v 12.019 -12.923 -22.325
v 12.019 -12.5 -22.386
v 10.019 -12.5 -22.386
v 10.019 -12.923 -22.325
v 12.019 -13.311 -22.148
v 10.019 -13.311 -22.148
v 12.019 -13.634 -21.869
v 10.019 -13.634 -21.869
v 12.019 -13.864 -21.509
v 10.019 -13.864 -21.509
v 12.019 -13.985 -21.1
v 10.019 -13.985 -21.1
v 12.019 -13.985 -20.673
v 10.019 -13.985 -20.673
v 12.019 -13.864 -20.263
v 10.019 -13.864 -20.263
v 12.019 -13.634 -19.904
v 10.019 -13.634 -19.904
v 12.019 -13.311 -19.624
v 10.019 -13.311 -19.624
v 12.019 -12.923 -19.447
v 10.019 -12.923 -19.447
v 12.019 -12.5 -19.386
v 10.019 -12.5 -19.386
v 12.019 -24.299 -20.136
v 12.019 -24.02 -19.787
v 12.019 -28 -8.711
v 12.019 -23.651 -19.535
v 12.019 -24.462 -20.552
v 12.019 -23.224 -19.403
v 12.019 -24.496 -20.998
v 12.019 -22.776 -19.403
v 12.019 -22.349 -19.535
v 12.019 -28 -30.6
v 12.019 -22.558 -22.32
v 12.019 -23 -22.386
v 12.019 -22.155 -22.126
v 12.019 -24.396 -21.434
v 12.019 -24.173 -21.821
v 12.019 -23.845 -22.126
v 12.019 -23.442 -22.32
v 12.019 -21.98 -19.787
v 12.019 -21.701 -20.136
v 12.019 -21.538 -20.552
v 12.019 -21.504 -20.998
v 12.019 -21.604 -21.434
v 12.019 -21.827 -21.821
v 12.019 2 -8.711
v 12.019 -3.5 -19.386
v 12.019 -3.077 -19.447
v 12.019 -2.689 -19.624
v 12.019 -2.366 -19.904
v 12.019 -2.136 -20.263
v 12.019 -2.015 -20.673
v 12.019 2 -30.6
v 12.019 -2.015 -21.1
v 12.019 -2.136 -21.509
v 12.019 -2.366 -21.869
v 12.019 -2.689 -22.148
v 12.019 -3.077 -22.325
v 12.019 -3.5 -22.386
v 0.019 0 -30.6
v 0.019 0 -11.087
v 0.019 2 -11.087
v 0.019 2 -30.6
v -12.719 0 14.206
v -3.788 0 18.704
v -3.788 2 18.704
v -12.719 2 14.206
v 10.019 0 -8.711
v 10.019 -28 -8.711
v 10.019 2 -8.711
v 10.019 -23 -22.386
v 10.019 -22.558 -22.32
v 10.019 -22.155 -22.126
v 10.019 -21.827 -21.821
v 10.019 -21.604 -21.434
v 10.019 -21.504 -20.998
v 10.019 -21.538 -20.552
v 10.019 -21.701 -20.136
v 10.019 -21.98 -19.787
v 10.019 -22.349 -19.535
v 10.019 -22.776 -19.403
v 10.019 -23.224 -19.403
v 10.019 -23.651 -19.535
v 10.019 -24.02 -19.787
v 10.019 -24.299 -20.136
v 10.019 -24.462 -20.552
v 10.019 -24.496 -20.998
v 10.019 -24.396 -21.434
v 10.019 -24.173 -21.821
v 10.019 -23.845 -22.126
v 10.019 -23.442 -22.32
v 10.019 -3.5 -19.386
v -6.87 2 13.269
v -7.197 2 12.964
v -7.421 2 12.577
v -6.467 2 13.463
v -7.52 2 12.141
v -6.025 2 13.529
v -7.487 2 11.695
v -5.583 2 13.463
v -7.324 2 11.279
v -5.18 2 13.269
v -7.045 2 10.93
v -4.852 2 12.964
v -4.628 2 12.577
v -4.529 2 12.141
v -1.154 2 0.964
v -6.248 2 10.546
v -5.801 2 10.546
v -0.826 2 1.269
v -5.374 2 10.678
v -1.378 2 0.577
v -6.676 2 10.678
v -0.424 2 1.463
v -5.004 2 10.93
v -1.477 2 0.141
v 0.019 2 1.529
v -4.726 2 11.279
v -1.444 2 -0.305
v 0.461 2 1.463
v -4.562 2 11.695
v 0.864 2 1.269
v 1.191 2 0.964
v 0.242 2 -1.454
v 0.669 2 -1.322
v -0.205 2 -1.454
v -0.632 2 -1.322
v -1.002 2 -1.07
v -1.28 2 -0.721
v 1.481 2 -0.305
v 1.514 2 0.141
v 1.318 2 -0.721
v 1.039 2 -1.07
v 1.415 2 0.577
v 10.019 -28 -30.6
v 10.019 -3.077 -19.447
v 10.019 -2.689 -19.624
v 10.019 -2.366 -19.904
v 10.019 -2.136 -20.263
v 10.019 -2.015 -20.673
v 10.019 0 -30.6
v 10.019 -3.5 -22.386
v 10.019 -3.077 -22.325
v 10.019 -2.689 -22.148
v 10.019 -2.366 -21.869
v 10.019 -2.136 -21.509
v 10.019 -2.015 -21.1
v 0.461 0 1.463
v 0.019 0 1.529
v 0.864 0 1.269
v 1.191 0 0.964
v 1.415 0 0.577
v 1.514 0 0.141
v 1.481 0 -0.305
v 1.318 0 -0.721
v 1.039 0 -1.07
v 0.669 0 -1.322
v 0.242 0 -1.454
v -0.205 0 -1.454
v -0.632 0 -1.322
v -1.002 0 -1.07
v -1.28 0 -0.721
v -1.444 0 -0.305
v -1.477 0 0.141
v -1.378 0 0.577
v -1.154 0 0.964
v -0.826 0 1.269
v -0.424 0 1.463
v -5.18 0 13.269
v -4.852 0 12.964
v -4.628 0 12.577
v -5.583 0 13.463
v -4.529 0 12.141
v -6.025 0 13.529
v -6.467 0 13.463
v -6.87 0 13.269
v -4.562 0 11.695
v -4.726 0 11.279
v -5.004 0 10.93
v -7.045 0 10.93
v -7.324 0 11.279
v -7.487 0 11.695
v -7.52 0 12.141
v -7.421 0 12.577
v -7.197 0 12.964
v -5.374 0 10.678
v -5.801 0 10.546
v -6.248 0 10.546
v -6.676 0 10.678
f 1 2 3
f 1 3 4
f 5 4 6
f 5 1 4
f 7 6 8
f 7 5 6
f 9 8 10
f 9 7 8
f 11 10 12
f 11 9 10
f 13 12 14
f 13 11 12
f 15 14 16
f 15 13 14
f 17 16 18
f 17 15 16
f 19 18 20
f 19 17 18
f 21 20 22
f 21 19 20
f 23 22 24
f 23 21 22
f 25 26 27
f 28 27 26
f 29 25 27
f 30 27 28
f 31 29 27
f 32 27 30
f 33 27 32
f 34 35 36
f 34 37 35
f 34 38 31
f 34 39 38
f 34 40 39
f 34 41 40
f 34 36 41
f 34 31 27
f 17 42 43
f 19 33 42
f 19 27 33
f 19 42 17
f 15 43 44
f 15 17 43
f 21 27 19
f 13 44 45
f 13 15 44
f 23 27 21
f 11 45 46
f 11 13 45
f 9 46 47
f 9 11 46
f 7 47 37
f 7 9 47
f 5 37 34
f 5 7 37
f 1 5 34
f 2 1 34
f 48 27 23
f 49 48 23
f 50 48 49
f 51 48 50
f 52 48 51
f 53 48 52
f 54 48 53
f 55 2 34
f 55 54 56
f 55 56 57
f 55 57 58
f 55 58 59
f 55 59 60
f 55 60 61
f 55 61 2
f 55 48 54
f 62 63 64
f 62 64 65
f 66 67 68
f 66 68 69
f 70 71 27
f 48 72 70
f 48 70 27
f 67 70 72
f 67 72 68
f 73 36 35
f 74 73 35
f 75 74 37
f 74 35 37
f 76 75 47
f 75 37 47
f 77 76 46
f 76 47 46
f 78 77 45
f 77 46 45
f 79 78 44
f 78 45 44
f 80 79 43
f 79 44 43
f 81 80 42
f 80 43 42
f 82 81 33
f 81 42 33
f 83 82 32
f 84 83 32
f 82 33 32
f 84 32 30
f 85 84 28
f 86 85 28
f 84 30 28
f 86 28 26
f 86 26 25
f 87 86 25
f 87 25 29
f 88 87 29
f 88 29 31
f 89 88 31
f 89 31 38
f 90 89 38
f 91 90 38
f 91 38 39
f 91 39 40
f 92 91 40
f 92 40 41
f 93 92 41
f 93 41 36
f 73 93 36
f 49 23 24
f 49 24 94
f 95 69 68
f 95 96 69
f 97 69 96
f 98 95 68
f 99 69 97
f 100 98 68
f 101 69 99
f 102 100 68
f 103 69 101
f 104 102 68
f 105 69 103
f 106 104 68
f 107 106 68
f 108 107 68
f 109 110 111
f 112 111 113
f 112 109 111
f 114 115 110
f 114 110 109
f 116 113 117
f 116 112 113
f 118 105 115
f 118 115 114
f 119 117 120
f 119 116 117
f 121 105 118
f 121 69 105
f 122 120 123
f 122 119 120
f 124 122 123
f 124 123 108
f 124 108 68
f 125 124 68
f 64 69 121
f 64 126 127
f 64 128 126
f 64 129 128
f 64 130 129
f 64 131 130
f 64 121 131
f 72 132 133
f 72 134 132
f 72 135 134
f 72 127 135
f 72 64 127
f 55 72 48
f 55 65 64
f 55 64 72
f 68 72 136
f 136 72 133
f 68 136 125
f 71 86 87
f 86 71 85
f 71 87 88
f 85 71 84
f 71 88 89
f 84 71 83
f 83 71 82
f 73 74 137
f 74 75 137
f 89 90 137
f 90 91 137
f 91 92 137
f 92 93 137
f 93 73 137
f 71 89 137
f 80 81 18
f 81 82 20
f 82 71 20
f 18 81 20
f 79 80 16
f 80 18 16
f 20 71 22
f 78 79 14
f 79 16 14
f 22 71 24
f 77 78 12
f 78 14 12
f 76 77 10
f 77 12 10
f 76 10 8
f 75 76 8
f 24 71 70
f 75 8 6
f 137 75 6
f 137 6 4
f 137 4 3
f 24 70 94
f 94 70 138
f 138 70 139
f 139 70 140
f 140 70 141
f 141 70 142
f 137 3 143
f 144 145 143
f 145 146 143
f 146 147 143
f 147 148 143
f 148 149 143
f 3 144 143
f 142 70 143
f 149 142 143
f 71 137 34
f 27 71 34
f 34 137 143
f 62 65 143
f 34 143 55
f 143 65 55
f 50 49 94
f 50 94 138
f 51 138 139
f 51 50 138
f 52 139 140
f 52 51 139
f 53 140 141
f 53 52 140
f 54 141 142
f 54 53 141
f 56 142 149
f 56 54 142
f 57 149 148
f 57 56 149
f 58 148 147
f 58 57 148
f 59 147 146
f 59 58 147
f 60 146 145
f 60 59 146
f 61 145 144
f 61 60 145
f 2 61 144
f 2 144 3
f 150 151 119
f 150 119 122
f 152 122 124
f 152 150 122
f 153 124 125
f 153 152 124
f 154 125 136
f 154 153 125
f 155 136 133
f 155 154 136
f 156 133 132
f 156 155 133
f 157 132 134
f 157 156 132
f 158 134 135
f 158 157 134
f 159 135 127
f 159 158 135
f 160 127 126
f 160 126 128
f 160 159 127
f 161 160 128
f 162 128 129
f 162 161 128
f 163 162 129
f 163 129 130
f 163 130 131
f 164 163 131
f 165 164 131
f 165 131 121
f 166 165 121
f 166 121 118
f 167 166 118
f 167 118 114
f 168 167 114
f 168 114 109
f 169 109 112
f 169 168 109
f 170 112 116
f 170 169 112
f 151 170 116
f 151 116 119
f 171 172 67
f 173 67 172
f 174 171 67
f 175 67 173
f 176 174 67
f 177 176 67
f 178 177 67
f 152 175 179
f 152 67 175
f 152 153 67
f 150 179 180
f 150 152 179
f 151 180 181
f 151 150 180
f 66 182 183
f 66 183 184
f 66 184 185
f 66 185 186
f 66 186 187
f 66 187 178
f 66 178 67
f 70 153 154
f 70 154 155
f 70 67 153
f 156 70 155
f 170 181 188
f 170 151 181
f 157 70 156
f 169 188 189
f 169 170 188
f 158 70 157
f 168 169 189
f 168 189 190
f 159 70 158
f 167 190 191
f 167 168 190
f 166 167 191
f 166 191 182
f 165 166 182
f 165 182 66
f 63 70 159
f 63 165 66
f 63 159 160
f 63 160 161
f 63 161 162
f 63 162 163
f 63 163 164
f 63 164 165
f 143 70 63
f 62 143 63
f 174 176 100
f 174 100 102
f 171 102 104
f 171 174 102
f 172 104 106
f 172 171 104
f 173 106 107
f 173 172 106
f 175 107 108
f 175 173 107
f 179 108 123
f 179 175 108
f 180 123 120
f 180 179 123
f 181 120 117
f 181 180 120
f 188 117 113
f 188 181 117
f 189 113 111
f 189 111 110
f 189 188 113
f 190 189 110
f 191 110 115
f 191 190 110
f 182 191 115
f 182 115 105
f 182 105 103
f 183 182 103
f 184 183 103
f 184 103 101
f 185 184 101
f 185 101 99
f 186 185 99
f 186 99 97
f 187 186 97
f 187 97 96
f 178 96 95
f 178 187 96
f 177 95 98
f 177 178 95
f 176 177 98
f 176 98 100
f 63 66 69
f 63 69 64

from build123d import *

# Parameters (mm, degrees)
SKETCH1_R           = 1.5
BOSS_EXTRUDE1_DEPTH = 2
SKETCH2_W           = 2
SKETCH2_H           = 21.888688708
BOSS_EXTRUDE2_DEPTH = 30
SKETCH4_R           = 1.5
CUT_EXTRUDE1_DEPTH  = 30


with BuildPart() as part:
    # Sketch1 → Boss-Extrude1 (new body)
    with BuildSketch(Plane(origin=(0, 0, 0), x_dir=(1, 0, 0), z_dir=(0, 1, 0))):
        Polygon((10.018564975, 30.6), (10.018564975, 8.711311292), (-3.787856503, -18.703932317), (-12.719216533, -14.206065265), (0.018564975, 11.087192922), (0.018564975, 30.6), align=None)
        with Locations(Location((0.018564975, -0.029187226, 0), (0, 0, 270))):
            Circle(SKETCH1_R, mode=Mode.SUBTRACT)
        with Locations(Location((-6.024680896, -12.029187226, 0), (0, 0, 270))):
            Circle(SKETCH1_R, mode=Mode.SUBTRACT)
    extrude(amount=BOSS_EXTRUDE1_DEPTH)

    # Sketch2 → Boss-Extrude2 (add)
    with BuildSketch(Plane(origin=(0, 2, 0), x_dir=(1, 0, 0), z_dir=(0, 1, 0))):
        with Locations((11.018564975, 19.655655646)):
            Rectangle(SKETCH2_W, SKETCH2_H)
    extrude(amount=-BOSS_EXTRUDE2_DEPTH)

    # Sketch4 → Cut-Extrude1 (cut)
    with BuildSketch(Plane(origin=(12.018564975, 0, 0), x_dir=(0, 0, -1), z_dir=(1, 0, 0))):
        with Locations((20.886224341, -23)):
            Circle(SKETCH4_R)
        with BuildLine():
            Line((22.386224341, -3.5), (22.386224341, -12.5))
            ThreePointArc((22.386224341, -12.5), (20.886224341, -14), (19.386224341, -12.5))
            Line((19.386224341, -12.5), (19.386224341, -3.5))
            ThreePointArc((19.386224341, -3.5), (20.886224341, -2), (22.386224341, -3.5))
        make_face()
    extrude(amount=-CUT_EXTRUDE1_DEPTH, mode=Mode.SUBTRACT)


solid = part.part
